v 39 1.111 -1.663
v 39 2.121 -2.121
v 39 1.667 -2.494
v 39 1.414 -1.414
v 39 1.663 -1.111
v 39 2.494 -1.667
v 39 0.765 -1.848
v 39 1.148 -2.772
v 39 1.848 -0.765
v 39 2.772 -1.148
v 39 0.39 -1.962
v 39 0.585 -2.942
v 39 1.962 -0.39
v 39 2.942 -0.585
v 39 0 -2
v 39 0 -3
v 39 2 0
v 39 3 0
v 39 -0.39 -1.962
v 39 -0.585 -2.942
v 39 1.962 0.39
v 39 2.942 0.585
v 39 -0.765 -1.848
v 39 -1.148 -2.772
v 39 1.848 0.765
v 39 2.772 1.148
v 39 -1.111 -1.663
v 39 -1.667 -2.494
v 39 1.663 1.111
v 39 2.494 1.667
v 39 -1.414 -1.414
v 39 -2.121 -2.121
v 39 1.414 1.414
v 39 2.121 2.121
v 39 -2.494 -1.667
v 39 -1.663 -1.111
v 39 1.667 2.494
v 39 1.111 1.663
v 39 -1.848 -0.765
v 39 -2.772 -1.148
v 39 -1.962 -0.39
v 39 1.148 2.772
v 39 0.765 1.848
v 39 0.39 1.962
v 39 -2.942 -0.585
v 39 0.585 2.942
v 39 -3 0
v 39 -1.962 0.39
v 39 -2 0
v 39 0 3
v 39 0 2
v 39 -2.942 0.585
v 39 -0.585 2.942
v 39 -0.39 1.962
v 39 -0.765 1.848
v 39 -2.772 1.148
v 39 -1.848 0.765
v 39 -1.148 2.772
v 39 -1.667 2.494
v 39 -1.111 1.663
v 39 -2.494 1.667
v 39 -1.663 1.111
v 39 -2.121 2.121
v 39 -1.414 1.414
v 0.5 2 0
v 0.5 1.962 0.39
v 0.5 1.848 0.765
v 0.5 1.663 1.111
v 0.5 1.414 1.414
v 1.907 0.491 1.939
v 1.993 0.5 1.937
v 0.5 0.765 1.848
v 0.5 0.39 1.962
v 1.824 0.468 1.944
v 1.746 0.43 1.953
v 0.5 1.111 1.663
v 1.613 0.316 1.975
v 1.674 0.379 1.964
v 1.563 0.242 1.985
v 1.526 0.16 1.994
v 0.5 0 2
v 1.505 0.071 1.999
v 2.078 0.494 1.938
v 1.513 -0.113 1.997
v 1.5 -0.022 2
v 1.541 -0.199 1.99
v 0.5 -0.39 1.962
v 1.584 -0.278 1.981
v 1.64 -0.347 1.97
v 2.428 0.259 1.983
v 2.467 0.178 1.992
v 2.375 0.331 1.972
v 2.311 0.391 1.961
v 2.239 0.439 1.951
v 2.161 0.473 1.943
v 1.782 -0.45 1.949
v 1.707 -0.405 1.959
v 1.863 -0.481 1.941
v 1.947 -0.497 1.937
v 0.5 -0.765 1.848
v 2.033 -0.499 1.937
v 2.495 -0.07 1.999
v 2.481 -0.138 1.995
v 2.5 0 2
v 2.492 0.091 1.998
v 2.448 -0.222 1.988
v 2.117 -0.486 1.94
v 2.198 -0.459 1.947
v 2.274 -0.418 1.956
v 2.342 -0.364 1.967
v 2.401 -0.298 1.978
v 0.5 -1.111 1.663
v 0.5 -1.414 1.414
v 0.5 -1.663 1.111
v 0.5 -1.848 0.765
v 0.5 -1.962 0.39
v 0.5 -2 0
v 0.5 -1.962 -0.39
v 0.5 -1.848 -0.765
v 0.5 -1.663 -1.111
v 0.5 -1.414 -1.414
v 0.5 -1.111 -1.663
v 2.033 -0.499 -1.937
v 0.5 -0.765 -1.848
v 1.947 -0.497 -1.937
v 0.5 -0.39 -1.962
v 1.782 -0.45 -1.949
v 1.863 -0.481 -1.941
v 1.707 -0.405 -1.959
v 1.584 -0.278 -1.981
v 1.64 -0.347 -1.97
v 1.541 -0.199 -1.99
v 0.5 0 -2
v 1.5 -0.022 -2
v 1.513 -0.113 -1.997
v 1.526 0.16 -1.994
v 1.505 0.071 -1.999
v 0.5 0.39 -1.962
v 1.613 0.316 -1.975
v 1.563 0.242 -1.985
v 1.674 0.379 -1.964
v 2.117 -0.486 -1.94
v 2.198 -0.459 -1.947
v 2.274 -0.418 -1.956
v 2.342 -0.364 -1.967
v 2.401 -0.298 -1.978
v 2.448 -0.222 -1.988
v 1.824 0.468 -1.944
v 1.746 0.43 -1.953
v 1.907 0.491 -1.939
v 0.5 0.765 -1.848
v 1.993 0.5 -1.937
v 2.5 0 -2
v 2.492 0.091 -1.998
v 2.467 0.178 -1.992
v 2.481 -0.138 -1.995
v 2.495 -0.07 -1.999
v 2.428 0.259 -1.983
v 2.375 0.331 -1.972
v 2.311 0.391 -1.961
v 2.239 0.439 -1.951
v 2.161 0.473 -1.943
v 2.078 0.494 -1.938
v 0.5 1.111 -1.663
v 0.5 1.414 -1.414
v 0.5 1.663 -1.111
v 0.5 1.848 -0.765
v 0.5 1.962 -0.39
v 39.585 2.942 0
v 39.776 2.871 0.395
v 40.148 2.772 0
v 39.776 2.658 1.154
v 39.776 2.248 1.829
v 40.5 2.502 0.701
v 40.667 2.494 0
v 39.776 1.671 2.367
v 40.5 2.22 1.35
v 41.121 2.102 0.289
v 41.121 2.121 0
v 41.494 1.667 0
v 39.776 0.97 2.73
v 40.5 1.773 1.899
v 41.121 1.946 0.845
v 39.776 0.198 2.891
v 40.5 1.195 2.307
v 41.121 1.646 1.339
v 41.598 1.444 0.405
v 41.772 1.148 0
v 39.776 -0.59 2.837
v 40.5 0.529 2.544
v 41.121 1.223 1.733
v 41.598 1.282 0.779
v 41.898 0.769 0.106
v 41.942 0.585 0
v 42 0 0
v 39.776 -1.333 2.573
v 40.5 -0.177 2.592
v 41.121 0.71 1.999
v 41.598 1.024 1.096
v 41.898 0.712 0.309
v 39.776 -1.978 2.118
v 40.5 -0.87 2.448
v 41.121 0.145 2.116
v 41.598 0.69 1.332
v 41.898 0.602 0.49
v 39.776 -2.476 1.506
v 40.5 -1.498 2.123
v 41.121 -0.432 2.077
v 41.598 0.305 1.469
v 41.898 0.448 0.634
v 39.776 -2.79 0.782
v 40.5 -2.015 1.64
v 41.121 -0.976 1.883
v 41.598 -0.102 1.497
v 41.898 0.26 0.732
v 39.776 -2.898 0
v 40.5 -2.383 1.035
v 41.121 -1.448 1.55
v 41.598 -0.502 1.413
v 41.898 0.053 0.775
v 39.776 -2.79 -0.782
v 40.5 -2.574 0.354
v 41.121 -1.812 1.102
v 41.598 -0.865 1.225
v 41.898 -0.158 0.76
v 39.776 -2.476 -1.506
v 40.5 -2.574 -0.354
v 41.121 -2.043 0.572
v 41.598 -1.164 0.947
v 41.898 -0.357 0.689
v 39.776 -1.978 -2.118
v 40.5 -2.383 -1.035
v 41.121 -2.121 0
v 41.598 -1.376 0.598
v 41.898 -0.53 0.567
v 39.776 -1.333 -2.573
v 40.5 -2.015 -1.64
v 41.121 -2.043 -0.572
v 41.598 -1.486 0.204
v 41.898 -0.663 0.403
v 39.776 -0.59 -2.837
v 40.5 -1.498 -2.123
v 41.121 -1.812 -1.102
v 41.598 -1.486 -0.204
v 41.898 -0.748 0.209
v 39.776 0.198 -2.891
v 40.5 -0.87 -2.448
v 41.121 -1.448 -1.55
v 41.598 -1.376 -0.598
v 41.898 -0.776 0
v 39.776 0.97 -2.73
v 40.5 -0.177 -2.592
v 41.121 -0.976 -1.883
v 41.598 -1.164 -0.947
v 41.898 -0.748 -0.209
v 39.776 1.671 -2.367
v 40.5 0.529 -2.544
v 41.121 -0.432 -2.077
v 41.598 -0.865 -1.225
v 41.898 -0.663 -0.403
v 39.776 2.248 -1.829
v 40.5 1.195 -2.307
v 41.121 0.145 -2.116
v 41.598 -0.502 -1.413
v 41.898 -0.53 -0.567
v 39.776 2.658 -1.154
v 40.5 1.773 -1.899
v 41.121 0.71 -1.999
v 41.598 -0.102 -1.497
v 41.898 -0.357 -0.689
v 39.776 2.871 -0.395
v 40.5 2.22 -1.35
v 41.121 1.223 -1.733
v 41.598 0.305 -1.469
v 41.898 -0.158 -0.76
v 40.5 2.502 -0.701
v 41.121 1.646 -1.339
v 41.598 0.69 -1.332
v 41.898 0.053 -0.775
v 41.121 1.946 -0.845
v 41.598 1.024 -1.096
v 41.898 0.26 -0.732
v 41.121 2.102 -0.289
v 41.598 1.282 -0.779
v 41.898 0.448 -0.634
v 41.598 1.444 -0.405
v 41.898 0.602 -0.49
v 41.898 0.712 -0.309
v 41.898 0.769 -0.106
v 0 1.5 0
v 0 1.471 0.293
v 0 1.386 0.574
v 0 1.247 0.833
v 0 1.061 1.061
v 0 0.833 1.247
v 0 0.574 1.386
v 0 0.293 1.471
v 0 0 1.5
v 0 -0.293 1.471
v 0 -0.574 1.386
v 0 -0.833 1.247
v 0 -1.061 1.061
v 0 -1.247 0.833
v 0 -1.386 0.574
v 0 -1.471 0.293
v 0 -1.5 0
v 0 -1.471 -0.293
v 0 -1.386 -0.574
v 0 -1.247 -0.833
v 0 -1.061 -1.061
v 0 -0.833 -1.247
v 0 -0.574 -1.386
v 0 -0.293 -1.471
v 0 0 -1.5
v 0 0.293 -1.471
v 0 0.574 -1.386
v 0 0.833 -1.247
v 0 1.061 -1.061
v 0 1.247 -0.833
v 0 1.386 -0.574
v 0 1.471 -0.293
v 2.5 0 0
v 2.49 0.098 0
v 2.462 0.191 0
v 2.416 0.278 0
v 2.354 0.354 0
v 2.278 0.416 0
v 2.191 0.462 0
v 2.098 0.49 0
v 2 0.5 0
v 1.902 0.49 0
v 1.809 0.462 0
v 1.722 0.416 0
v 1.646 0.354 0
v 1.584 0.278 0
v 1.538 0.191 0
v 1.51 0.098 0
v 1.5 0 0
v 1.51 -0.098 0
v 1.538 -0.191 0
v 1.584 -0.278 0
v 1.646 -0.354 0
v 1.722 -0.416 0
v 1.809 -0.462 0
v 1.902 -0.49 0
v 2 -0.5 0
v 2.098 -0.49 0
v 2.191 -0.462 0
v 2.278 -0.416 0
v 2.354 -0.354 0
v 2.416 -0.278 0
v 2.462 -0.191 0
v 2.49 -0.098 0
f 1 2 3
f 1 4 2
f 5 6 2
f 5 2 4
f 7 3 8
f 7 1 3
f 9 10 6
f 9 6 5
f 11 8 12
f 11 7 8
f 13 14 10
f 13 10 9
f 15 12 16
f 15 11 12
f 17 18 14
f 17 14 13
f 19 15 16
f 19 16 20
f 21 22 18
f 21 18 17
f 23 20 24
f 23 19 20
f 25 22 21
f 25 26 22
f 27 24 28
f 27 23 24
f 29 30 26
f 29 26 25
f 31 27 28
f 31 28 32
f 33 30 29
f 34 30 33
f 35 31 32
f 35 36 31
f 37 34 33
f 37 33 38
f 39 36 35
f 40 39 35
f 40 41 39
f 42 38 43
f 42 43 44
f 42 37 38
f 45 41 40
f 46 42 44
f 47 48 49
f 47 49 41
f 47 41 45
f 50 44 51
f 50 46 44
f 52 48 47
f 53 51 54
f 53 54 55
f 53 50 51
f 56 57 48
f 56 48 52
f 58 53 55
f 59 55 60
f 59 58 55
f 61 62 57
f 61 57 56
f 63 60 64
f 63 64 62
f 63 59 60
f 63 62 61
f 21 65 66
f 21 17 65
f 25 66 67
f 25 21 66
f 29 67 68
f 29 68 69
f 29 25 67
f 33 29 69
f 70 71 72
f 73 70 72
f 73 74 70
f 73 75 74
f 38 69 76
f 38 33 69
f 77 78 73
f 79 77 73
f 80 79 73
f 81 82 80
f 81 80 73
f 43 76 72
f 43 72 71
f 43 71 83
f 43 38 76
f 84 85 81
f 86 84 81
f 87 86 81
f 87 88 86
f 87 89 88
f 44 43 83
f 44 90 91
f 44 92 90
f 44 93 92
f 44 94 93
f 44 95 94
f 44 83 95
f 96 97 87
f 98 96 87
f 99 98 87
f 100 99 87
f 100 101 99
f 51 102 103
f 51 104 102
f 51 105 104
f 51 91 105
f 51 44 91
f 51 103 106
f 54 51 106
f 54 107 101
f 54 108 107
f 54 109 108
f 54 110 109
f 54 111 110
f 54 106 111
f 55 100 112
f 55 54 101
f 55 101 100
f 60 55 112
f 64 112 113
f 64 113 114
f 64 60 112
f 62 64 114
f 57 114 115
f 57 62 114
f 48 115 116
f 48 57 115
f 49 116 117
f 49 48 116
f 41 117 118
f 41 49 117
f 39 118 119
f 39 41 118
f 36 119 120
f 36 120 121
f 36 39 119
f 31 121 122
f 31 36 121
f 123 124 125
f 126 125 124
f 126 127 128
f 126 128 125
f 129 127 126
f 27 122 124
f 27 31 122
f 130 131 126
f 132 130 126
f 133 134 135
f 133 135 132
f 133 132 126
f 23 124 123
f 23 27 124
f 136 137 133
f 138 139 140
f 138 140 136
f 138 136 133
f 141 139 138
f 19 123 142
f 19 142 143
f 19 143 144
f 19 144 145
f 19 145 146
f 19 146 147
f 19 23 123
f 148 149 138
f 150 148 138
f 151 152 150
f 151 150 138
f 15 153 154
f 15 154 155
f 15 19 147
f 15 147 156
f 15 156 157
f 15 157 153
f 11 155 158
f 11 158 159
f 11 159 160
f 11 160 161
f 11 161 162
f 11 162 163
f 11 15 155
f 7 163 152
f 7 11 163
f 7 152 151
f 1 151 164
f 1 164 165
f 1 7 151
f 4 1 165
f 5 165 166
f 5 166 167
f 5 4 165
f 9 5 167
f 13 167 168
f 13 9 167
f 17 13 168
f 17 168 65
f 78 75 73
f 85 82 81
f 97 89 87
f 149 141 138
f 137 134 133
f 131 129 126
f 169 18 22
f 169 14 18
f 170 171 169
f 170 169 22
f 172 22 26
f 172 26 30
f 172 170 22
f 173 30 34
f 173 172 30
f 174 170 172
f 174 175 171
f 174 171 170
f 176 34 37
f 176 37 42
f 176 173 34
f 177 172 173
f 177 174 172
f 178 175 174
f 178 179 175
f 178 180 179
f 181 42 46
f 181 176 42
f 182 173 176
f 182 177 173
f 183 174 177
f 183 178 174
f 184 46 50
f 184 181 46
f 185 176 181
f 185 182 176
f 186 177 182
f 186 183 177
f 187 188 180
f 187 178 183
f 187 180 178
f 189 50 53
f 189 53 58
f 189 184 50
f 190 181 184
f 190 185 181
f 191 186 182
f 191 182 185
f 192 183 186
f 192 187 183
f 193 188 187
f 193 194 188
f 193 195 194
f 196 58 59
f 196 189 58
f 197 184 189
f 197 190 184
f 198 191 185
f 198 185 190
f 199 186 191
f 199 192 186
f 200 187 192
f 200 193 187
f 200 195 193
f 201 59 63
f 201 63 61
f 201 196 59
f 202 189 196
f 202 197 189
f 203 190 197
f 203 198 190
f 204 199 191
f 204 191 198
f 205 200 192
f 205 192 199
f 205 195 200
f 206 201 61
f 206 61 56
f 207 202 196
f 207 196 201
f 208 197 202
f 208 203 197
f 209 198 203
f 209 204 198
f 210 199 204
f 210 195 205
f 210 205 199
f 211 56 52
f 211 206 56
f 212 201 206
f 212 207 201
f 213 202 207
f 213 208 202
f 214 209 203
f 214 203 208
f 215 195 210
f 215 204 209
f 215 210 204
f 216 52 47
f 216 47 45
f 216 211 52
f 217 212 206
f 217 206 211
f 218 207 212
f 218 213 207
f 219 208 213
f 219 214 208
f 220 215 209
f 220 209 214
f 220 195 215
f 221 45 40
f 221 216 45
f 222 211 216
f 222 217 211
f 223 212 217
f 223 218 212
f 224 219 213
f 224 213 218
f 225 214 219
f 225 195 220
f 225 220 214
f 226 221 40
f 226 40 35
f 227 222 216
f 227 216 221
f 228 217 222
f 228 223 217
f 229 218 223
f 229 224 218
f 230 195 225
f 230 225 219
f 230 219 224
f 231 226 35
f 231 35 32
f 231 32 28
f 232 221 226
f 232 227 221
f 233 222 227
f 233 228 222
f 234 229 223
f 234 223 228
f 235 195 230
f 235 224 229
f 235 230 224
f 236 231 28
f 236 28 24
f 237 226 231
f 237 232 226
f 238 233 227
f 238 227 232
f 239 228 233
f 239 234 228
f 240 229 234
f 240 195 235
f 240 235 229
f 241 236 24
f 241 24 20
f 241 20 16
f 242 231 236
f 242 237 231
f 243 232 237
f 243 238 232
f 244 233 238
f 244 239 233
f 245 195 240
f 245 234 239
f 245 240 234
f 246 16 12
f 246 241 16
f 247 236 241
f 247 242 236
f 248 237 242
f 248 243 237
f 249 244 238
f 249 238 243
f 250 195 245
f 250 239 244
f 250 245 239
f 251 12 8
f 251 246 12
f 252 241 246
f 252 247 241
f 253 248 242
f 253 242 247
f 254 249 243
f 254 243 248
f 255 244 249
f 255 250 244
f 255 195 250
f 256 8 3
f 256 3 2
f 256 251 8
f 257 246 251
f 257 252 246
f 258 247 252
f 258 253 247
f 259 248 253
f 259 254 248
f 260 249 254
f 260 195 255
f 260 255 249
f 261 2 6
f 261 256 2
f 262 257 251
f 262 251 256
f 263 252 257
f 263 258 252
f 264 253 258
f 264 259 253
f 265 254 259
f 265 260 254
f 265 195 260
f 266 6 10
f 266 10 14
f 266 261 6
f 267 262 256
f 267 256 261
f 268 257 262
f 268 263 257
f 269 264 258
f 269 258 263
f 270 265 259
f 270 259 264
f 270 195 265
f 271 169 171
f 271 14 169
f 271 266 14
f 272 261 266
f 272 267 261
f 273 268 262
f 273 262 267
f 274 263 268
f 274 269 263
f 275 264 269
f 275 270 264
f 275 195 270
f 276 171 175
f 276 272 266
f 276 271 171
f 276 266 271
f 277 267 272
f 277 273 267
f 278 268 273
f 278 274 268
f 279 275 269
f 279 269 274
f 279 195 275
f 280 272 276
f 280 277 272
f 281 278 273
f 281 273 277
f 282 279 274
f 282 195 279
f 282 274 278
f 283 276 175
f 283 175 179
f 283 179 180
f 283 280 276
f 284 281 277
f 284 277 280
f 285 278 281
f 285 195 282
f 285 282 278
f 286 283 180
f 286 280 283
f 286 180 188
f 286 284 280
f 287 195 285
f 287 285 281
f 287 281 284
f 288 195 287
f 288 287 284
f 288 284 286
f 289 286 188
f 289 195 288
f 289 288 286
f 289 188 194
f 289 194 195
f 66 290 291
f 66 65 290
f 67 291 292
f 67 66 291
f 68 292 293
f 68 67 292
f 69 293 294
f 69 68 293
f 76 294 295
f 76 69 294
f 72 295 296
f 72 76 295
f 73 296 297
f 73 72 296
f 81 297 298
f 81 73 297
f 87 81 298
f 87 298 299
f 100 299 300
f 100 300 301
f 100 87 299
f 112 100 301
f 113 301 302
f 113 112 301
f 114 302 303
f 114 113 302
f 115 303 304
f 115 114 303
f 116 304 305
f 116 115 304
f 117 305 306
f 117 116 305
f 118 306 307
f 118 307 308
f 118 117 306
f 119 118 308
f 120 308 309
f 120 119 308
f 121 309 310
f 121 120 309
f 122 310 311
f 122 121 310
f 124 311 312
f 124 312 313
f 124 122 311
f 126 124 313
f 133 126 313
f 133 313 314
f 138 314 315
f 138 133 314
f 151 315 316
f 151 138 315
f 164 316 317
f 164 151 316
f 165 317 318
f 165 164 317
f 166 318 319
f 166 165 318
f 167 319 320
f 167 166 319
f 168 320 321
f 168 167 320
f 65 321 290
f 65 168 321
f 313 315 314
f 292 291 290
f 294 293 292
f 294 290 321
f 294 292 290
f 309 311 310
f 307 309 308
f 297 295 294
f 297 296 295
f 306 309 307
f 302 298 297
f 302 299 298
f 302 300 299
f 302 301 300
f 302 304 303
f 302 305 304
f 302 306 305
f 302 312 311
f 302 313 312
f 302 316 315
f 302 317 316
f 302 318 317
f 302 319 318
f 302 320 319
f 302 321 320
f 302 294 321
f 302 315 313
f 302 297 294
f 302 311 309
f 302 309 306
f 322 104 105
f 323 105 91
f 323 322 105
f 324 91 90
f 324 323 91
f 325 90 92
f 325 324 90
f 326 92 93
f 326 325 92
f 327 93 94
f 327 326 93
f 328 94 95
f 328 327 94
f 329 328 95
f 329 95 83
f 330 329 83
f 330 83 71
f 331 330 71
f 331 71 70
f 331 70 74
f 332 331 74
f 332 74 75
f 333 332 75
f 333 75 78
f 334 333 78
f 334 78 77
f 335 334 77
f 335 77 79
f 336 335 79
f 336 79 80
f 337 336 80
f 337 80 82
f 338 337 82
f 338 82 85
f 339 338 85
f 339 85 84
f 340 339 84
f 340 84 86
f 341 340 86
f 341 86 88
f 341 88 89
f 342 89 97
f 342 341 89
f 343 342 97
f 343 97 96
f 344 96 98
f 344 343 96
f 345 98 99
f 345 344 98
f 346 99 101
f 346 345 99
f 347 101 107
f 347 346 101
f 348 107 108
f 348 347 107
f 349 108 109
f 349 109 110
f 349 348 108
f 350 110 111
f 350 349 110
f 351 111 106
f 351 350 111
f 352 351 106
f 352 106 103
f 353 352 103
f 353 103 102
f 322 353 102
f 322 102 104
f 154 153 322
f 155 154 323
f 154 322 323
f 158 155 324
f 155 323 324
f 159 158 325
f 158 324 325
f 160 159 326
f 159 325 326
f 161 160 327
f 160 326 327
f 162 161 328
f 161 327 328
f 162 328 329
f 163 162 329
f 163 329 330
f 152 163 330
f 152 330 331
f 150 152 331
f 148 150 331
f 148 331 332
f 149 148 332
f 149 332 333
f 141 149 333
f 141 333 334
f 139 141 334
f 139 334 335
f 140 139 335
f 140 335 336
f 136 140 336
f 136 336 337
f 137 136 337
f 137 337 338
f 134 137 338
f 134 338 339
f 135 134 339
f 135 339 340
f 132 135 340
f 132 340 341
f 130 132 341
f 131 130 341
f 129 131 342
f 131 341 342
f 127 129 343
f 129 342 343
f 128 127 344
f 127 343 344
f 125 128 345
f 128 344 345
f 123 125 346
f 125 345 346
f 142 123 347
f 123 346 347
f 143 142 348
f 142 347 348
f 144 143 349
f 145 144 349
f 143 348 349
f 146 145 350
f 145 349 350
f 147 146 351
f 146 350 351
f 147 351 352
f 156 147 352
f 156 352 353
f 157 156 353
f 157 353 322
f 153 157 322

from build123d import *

# Parameters (mm, degrees)
SKETCH2_R               = 0.5
CUT_EXTRUDE1_DEPTH      = 4
CUT_EXTRUDE1_DEPTH_BACK = 4


with BuildPart() as part:
    # Sketch1 → Revolve1 (revolve)
    with BuildSketch(Plane.XY):
        with BuildLine():
            Line((0, 0), (0, 1.5))
            Line((0, 1.5), (0.5, 2))
            Line((0.5, 2), (39, 2))
            Line((39, 2), (39, 3))
            ThreePointArc((39, 3), (41.121320344, 2.121320344), (42, 0))
            Line((42, 0), (0, 0))
        make_face()
    revolve(axis=Axis((0, 0, 0), (1, 0, 0)))

    # Sketch2 → Cut-Extrude1 (cut, two sides)
    with BuildSketch(Plane.XY) as cut_extrude1_sk:
        with Locations((2, 0)):
            Circle(SKETCH2_R)
    extrude(amount=CUT_EXTRUDE1_DEPTH, mode=Mode.SUBTRACT)
    extrude(cut_extrude1_sk.sketch, amount=-CUT_EXTRUDE1_DEPTH_BACK, mode=Mode.SUBTRACT)


solid = part.part
